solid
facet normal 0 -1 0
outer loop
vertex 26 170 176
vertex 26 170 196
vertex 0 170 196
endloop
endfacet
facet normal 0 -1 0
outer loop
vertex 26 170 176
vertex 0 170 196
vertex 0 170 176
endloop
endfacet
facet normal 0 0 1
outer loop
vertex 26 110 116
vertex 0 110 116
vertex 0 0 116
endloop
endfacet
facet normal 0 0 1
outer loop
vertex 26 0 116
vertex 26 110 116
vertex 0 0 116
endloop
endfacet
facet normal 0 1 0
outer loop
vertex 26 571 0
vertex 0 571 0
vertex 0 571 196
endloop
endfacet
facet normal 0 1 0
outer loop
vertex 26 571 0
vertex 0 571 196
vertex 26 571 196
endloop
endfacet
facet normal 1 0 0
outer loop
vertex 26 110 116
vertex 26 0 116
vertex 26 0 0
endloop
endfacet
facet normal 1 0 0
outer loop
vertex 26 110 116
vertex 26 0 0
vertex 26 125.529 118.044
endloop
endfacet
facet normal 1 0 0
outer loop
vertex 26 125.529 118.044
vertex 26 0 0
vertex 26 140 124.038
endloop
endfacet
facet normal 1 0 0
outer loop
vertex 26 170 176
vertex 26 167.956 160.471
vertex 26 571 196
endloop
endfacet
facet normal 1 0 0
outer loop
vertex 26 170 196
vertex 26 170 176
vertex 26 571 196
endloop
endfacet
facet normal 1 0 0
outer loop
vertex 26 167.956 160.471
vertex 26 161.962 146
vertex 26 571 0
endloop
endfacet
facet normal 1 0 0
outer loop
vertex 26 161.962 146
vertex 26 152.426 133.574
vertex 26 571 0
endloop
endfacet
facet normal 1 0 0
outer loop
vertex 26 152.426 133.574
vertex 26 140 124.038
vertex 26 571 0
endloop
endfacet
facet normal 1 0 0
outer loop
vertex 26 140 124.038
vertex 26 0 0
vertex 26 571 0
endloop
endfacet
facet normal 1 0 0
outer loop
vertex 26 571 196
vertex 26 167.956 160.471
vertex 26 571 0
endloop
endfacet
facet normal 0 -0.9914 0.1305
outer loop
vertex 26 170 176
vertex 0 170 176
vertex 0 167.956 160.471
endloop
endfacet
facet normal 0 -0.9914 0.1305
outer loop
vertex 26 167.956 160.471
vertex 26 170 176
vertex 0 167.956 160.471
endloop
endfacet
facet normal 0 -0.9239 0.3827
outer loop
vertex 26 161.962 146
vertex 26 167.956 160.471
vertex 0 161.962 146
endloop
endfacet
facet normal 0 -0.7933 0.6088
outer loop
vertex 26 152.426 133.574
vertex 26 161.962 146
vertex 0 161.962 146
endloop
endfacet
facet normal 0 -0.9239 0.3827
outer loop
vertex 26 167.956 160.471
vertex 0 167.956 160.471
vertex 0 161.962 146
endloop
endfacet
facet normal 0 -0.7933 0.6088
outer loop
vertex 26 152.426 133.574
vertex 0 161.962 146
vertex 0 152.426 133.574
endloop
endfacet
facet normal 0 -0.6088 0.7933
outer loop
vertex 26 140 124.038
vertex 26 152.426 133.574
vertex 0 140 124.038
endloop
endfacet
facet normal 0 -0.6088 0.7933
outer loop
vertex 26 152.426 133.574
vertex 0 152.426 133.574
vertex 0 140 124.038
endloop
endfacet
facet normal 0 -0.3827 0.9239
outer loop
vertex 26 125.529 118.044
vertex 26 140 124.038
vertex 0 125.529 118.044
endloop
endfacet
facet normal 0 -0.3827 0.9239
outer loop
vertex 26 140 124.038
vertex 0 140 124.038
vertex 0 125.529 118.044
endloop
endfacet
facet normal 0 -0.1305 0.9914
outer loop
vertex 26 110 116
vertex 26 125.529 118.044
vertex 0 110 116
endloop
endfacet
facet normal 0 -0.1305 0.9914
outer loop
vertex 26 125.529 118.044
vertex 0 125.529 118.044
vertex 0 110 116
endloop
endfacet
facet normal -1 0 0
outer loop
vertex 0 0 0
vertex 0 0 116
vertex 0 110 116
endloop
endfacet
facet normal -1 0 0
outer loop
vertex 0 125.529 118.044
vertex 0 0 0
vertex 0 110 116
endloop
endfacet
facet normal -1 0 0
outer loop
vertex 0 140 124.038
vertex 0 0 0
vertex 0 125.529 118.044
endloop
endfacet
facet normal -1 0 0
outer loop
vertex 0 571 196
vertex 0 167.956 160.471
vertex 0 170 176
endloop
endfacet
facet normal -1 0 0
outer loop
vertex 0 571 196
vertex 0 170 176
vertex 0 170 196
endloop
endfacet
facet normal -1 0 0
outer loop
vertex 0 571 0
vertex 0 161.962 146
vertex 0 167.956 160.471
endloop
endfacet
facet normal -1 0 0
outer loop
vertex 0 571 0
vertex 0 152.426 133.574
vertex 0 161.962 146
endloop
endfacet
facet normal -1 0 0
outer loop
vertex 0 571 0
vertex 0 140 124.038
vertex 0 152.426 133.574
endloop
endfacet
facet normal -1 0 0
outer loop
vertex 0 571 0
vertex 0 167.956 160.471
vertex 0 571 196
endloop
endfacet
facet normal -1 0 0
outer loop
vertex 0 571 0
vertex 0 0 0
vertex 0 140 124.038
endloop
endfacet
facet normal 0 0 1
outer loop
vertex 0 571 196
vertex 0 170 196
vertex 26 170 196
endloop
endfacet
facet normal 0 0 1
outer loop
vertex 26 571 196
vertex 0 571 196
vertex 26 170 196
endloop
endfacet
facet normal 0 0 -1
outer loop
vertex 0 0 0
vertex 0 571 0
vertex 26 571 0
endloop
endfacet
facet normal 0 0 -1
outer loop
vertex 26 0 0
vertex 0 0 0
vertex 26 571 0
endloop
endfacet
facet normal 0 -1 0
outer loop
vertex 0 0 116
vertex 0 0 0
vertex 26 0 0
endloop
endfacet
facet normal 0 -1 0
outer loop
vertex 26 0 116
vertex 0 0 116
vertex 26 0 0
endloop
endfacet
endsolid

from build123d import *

# Parameters (mm, degrees)
BOX_W        = 26
BOX_H        = 571
BOX_DEPTH    = 196
POCKET_DEPTH = 26.001


with BuildPart() as part:
    # Box → Box (new body)
    with BuildSketch(Plane.XY):
        with Locations((13, 285.5)):
            Rectangle(BOX_W, BOX_H)
    extrude(amount=BOX_DEPTH)

    # Sketch (on Face1 of Box) → Pocket (cut, through all)
    with BuildSketch(Plane(origin=(0, 0, 0), x_dir=(0, -1, 0), z_dir=(-1, 0, 0))):
        with BuildLine():
            ThreePointArc((-170, 176), (-152.426407, 133.573593), (-110, 116))
            Line((-110, 116), (0, 116))
            Line((0, 200), (0, 116))
            Line((-170, 200), (0, 200))
            Line((-170, 200), (-170, 176))
        make_face()
    extrude(amount=-POCKET_DEPTH, mode=Mode.SUBTRACT)


solid = part.part
